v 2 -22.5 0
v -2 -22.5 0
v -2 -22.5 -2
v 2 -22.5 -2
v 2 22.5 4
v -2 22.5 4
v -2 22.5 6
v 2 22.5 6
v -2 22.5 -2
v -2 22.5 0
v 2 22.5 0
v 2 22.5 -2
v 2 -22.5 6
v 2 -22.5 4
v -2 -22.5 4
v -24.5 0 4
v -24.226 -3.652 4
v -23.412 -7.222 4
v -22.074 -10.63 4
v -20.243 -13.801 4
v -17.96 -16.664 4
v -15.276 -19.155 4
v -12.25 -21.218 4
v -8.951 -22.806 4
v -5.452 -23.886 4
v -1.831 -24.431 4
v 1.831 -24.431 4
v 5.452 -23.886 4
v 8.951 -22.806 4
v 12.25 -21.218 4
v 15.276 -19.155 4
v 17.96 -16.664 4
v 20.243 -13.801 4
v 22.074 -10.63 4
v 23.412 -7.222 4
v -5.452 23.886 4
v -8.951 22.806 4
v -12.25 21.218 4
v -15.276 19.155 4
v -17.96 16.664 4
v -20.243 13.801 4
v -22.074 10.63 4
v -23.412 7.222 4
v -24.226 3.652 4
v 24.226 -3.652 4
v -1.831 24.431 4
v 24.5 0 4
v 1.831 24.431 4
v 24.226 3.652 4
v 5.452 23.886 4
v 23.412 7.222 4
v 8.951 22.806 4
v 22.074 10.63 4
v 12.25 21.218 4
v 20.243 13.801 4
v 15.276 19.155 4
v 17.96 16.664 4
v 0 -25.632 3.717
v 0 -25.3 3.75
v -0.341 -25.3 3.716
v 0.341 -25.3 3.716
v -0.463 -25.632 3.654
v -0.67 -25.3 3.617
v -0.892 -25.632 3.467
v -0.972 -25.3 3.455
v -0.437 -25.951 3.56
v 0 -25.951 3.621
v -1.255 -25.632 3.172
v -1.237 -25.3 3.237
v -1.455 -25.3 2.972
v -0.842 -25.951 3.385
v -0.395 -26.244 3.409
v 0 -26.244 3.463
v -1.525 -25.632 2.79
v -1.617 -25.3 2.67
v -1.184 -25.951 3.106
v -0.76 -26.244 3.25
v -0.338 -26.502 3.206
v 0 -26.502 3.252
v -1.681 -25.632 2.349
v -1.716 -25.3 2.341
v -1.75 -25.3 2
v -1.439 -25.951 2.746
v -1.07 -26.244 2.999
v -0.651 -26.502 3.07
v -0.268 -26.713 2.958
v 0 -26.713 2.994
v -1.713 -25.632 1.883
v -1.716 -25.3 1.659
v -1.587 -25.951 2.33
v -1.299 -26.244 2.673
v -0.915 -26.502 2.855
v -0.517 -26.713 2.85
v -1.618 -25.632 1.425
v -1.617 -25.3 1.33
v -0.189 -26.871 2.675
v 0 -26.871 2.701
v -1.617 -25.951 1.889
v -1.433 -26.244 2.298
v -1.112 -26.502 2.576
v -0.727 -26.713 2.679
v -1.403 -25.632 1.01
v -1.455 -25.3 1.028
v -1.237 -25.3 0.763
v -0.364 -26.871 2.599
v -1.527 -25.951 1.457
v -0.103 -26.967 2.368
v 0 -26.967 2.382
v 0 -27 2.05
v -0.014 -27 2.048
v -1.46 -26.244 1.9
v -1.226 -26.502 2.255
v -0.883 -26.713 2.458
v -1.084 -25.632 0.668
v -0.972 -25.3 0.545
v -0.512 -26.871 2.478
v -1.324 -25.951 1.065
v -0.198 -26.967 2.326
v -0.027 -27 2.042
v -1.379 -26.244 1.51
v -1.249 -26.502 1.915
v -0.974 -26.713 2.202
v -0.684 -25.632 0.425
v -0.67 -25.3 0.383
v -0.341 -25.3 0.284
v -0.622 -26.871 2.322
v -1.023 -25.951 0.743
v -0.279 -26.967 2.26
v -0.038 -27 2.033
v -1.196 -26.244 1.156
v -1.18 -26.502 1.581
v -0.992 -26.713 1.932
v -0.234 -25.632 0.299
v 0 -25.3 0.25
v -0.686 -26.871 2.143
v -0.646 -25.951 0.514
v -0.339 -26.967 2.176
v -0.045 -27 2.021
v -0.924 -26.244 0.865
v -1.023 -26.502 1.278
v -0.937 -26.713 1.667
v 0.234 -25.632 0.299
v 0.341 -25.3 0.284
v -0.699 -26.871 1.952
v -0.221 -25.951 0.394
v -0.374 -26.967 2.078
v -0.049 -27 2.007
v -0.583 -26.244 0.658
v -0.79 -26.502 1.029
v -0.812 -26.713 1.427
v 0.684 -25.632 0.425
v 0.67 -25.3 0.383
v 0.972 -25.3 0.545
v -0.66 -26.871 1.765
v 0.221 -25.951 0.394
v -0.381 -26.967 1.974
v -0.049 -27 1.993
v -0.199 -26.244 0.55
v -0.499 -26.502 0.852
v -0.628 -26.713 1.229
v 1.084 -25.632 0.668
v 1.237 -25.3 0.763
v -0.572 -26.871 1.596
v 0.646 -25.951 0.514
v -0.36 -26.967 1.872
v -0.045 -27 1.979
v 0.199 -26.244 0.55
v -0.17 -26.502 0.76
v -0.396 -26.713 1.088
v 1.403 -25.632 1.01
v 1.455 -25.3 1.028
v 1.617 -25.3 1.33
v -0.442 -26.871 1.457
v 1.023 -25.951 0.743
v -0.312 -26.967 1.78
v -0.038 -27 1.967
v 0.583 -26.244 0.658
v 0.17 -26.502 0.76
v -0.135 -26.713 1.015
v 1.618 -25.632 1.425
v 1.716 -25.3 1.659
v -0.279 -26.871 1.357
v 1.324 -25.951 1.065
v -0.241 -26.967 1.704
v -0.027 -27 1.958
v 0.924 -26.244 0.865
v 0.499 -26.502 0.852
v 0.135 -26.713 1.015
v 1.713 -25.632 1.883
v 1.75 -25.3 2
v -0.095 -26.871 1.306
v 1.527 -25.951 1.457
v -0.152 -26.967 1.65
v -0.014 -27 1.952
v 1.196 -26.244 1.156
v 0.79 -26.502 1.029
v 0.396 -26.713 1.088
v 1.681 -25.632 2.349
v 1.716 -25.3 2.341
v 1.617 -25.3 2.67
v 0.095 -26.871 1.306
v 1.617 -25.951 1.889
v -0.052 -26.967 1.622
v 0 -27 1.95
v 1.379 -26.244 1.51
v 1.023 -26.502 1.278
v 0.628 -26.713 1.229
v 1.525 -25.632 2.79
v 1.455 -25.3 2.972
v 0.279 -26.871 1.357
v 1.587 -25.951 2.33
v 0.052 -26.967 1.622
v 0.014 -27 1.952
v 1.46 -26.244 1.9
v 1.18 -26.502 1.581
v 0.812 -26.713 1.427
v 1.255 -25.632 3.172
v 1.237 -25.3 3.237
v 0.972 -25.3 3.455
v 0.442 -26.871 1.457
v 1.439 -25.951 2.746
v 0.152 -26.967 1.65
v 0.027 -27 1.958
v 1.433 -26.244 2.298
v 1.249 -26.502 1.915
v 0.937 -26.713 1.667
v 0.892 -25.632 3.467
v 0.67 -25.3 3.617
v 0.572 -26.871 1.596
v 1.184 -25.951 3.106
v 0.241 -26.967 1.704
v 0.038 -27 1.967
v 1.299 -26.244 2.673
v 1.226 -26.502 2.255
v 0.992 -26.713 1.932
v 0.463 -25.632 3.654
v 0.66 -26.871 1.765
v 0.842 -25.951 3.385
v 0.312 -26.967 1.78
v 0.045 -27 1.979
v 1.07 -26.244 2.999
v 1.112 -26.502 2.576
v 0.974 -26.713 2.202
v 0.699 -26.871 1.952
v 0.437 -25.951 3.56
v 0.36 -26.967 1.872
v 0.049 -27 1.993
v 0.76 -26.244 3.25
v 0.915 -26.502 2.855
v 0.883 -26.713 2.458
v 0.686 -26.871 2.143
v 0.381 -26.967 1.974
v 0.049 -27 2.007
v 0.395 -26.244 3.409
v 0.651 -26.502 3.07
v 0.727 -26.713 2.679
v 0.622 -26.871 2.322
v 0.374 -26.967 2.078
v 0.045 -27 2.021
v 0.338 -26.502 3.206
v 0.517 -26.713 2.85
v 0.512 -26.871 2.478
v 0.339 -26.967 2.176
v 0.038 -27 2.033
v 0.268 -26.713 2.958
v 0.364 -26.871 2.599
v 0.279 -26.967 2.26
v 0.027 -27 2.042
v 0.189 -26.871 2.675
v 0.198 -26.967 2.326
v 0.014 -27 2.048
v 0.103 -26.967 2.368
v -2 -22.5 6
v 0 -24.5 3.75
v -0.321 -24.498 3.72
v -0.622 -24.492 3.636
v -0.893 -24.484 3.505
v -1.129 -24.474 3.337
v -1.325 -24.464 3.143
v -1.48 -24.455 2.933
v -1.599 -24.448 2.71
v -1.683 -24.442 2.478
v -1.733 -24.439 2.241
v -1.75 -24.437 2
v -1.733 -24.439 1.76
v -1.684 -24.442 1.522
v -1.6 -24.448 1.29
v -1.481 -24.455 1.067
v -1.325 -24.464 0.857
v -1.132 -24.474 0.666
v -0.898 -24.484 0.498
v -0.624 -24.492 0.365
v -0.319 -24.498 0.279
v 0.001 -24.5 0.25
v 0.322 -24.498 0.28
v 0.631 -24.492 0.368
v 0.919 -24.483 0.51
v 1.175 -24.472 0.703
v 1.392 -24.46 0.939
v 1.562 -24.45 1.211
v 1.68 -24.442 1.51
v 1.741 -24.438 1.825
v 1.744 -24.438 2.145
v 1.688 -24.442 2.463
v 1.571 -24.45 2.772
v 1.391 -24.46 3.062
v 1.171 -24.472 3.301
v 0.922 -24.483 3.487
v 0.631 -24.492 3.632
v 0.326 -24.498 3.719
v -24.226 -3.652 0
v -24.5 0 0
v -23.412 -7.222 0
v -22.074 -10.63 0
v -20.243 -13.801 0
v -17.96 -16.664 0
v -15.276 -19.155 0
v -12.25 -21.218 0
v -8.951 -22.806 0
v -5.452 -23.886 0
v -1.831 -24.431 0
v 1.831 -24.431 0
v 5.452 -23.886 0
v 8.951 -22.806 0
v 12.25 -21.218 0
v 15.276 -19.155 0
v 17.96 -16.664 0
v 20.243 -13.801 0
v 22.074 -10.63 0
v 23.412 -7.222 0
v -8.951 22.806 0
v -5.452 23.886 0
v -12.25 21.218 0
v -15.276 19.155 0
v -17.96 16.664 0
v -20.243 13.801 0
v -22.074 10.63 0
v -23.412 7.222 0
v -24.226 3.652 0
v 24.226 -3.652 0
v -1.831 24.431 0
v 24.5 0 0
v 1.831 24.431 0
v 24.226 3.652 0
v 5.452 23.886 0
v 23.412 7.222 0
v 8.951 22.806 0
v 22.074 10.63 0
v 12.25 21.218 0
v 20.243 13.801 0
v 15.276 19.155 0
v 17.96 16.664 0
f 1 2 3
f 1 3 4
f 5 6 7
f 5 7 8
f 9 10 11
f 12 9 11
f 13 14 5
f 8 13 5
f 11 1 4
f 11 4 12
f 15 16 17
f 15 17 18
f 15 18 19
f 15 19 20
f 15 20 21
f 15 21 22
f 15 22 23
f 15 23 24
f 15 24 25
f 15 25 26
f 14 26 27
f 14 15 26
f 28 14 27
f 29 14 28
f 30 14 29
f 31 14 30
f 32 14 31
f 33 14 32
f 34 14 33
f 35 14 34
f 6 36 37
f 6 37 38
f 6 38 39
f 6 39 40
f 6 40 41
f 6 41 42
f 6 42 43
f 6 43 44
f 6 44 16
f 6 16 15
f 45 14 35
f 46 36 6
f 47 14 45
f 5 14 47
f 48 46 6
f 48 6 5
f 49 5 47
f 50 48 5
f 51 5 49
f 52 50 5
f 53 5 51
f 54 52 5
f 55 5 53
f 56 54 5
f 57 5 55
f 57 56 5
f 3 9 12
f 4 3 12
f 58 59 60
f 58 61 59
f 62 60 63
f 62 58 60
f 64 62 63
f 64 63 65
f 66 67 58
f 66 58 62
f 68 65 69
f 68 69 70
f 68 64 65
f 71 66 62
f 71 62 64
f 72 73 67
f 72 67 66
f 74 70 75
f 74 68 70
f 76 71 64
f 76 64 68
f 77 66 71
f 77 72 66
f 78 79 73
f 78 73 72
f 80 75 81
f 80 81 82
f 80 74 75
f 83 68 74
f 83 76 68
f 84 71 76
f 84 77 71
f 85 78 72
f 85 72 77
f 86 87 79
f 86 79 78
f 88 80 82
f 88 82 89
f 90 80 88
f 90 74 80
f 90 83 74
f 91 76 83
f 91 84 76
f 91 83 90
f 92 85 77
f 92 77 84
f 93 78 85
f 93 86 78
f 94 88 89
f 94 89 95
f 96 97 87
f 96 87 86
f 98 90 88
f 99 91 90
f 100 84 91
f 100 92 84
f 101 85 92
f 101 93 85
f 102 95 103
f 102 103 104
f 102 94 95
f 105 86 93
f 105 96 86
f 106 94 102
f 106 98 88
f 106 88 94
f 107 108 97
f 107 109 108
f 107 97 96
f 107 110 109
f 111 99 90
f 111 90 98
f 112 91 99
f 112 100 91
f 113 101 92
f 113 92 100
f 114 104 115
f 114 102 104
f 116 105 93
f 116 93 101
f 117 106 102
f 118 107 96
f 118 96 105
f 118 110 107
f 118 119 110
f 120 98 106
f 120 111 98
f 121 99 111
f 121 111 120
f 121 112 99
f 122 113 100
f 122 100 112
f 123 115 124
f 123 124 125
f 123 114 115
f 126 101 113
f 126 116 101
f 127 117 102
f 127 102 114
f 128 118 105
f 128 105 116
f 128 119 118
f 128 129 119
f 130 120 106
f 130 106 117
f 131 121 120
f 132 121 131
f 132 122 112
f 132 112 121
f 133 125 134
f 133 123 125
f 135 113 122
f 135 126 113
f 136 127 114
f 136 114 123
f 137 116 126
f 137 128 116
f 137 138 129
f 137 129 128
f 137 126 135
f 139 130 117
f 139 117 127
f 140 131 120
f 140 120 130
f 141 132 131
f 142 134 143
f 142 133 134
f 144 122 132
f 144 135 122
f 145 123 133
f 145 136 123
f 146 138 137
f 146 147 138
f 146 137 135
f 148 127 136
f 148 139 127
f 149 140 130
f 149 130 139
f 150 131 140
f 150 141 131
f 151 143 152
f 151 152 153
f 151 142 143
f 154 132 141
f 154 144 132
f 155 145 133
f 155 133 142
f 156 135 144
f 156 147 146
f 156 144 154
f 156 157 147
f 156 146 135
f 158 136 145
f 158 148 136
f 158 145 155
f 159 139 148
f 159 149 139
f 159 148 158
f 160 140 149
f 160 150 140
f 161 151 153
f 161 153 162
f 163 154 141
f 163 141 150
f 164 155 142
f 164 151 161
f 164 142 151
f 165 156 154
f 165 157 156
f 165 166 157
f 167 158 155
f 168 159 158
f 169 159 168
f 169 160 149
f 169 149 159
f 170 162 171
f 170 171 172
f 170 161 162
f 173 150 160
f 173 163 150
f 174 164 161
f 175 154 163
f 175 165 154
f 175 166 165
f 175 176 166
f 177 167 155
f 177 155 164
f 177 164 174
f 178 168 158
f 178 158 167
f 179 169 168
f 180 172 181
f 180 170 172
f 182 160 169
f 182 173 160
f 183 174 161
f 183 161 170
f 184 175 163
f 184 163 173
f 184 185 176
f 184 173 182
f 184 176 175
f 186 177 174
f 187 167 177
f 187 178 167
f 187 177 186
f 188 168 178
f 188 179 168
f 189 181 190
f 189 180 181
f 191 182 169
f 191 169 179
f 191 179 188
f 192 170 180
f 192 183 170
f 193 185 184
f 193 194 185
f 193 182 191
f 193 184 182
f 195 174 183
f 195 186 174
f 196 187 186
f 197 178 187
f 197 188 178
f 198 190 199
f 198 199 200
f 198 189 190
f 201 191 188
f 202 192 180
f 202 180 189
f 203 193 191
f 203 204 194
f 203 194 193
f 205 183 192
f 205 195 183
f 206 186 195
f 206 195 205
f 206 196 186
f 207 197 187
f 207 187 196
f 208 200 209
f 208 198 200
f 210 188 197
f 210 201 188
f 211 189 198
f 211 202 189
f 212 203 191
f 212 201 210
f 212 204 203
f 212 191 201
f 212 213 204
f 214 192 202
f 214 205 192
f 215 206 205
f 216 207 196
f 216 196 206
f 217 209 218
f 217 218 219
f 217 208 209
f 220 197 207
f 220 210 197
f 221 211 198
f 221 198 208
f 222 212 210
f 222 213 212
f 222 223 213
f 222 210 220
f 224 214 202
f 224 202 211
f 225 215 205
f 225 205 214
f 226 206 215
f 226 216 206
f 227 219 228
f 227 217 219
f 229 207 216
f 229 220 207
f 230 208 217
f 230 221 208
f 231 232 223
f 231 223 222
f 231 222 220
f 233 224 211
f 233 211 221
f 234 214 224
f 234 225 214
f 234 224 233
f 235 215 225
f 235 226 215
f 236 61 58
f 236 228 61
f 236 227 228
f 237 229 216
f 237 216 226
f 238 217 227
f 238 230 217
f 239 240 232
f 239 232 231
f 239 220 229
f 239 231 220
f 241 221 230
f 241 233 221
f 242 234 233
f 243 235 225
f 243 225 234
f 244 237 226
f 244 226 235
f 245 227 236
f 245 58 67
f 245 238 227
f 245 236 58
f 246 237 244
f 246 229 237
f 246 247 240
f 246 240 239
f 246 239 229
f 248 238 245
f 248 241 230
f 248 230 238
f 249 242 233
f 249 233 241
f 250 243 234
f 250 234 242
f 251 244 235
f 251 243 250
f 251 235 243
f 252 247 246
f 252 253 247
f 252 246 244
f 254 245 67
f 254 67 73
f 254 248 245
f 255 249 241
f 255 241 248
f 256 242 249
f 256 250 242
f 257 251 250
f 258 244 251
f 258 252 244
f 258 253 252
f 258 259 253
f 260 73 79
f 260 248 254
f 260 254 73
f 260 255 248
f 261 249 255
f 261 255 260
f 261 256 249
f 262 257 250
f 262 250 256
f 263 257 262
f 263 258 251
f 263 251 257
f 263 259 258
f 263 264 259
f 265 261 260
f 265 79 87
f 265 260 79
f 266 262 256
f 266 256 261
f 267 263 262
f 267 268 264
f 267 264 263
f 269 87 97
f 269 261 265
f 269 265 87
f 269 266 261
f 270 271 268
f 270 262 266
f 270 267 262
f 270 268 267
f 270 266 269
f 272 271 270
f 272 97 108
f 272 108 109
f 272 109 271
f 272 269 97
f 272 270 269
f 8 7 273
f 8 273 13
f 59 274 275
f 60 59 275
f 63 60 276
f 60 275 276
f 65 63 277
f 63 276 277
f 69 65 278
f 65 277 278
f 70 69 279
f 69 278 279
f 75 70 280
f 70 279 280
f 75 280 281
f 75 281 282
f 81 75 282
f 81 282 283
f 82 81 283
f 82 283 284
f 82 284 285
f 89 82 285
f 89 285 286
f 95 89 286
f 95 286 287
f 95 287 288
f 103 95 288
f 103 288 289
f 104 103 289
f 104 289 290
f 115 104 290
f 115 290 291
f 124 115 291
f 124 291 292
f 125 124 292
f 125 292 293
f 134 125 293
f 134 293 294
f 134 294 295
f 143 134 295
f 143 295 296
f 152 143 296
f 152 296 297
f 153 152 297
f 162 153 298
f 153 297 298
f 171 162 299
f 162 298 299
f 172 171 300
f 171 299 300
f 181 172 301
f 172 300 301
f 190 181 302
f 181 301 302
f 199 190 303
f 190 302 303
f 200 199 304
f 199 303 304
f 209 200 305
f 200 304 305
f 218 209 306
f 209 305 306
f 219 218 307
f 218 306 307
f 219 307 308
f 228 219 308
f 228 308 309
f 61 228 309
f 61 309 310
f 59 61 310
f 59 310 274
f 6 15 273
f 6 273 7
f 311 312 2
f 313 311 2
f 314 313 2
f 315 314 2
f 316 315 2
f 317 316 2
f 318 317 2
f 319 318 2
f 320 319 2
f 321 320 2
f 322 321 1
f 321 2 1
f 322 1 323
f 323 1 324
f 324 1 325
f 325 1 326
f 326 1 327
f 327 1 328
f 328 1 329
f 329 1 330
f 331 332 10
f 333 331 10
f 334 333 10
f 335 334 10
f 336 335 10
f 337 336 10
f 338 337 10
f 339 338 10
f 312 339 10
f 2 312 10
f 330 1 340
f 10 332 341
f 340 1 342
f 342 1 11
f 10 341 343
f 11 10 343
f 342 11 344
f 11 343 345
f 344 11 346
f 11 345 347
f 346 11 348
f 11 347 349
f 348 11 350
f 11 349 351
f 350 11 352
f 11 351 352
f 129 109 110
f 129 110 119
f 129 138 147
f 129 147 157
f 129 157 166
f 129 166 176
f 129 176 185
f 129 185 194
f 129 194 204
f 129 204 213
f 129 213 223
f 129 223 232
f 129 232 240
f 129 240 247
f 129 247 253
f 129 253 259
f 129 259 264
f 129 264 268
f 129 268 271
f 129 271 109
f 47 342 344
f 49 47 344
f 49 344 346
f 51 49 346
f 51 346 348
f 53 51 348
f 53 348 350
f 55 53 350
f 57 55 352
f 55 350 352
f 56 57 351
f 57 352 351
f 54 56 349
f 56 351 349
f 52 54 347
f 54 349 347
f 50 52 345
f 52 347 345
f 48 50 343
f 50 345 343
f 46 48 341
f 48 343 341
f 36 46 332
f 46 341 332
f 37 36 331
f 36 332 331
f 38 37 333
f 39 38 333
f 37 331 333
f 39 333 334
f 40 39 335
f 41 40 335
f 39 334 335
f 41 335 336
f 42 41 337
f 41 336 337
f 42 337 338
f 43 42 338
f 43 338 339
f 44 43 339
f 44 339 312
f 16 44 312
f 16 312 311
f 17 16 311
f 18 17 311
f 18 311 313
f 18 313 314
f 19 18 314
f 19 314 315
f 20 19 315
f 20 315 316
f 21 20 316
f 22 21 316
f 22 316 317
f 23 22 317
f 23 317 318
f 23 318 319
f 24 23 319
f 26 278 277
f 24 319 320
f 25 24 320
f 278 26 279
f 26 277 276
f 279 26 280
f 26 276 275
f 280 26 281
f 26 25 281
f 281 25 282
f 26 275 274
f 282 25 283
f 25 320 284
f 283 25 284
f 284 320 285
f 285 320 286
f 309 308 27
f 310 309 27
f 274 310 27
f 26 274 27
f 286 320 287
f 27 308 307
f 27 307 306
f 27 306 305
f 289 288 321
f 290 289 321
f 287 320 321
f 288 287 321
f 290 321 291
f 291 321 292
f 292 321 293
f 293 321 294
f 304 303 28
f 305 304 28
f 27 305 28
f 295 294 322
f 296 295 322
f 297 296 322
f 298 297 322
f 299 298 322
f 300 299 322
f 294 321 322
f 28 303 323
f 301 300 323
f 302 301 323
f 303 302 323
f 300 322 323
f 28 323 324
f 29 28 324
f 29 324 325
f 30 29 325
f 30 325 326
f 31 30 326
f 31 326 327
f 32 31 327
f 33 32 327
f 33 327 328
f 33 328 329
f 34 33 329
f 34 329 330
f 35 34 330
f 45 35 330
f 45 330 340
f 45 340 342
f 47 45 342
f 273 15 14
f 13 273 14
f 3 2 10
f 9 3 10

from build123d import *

# Parameters (mm, degrees)
SKETCH_1_R      = 24.5
EXTRUDE_1_DEPTH = 4
SKETCH_2_W      = 4
SKETCH_2_H      = 45
EXTRUDE_2_DEPTH = 2
SKETCH_3_R      = 1.75
EXTRUDE_3_DEPTH = 3
FILLET_2_R      = 1.7


with BuildPart() as part:
    # 草图1 → 凸台-拉伸1 (new body)
    with BuildSketch(Plane.XY):
        Circle(SKETCH_1_R)
    extrude(amount=EXTRUDE_1_DEPTH)

    # 草图2 → 凸台-拉伸2 (add)
    with BuildSketch(Plane.XY.offset(4)):
        Rectangle(SKETCH_2_W, SKETCH_2_H)
    extrude_2 = extrude(amount=EXTRUDE_2_DEPTH)

    # 镜向1: 凸台-拉伸2 across plane
    add(extrude_2.mirror(Plane.XY.offset(2)))

    # 草图3 → 凸台-拉伸3 (add)
    with BuildSketch(Plane(origin=(0, -24, 0), x_dir=(-1, 0, 0), z_dir=(0, -1, 0))):
        with Locations(Location((0, -2, 0), (0, 0, 270))):
            Circle(SKETCH_3_R)
    extrude(amount=EXTRUDE_3_DEPTH)

    # 圆角2
    fillet_2_edges = [part.edges().sort_by_distance(p)[0] for p in [
        (0, -27, 0.25),
    ]]
    fillet(fillet_2_edges, radius=FILLET_2_R)


solid = part.part
